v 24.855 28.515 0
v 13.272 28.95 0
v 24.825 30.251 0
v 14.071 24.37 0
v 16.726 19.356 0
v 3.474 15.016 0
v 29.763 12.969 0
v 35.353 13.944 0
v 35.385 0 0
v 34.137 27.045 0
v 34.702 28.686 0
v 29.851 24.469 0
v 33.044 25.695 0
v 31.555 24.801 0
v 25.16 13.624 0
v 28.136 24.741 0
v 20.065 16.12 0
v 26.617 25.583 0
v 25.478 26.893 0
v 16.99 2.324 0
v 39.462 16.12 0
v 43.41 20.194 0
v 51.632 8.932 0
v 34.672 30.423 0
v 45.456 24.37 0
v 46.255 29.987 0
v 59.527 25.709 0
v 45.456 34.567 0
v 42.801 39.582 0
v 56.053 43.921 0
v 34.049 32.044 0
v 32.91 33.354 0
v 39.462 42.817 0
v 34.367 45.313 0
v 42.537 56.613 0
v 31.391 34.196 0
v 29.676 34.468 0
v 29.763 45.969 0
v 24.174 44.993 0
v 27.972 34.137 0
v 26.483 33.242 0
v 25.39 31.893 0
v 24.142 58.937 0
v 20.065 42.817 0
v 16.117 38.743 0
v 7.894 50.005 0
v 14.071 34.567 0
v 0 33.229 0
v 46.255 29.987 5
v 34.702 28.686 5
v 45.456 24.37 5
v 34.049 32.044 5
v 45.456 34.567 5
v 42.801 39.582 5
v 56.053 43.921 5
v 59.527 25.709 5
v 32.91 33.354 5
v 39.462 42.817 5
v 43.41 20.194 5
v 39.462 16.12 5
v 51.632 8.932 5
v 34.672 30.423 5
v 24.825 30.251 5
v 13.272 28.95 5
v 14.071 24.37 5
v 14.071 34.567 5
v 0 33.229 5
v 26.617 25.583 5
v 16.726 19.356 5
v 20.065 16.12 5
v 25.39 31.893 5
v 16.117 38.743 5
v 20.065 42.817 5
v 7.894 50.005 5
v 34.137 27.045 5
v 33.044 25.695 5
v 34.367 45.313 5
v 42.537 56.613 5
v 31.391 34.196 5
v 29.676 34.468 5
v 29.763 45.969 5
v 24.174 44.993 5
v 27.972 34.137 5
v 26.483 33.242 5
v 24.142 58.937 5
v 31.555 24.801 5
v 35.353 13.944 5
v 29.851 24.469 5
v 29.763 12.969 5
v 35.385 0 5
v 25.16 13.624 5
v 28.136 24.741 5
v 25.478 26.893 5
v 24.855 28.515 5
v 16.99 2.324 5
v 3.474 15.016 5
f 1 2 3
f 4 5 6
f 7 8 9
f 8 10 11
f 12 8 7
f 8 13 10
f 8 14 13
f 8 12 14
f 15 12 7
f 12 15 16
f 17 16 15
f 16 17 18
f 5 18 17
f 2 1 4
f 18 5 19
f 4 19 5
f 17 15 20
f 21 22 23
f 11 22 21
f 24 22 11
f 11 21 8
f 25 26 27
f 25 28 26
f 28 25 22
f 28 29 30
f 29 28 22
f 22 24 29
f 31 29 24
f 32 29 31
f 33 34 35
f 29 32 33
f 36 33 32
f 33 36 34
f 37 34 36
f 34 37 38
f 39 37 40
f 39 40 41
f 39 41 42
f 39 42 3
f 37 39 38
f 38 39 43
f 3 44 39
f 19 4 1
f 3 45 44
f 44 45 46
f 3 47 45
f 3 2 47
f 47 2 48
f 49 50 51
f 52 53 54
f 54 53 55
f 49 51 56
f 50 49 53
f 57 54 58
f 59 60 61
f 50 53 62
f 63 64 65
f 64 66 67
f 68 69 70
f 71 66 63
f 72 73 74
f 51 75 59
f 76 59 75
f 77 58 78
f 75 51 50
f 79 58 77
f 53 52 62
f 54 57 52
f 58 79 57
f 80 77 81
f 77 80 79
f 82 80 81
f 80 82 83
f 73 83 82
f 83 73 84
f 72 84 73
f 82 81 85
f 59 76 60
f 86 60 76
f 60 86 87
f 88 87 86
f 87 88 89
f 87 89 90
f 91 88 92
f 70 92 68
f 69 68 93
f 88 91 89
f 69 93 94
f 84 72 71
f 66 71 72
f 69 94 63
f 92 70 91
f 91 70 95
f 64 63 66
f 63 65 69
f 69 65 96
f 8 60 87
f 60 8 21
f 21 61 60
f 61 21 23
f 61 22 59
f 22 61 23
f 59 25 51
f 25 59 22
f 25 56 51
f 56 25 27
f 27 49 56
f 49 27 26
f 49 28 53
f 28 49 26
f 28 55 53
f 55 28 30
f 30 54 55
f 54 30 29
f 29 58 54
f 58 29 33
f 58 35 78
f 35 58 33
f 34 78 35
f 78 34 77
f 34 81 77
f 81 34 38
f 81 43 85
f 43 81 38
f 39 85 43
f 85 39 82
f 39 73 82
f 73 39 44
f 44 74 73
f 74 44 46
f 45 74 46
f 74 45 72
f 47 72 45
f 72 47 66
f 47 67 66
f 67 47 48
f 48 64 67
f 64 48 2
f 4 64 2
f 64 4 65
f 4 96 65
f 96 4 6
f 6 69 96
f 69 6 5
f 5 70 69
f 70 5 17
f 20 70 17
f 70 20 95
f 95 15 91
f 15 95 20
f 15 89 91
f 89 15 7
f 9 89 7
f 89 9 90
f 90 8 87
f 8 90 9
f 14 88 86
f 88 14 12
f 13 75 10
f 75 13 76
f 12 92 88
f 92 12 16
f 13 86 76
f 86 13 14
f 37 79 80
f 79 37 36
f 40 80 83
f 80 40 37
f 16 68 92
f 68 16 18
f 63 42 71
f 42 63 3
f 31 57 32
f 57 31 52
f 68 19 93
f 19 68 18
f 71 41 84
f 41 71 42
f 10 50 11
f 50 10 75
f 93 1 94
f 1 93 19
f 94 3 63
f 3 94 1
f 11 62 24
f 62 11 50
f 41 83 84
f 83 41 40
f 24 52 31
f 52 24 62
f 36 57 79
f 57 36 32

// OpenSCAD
$fn = 32;

// ----------------------------------------------------------------------
// Star wheel: 10-point ratchet, R30
// ----------------------------------------------------------------------

// --- parameters (mm) ---
n_points = 10;            // number of points / teeth
r_out = 30;               // tip radius
r_in = 16.5;              // root radius
bore_r = 5;               // centre bore radius
plate_t = 5;              // plate thickness, Z (extrusion height)
bore_d = 10;              // centre bore diameter

profile = [[29.763, 45.969], [24.142, 58.937], [24.174, 44.993], [20.065, 42.817], [7.894, 50.005], [16.117, 38.743], [14.071, 34.567], [0, 33.229], [13.272, 28.95], [14.071, 24.37], [3.474, 15.016], [16.726, 19.356], [20.065, 16.12], [16.99, 2.324], [25.16, 13.624], [29.763, 12.969], [35.385, 0], [35.353, 13.944], [39.462, 16.12], [51.632, 8.932], [43.41, 20.194], [45.456, 24.37], [59.527, 25.709], [46.255, 29.987], [45.456, 34.567], [56.053, 43.921], [42.801, 39.582], [39.462, 42.817], [42.537, 56.613], [34.367, 45.313]];  // primary outline, 30 points, counter clockwise
void_1 = [[34.672, 30.423], [34.049, 32.044], [32.91, 33.354], [31.391, 34.196], [29.676, 34.468], [27.972, 34.137], [26.483, 33.242], [25.39, 31.893], [24.825, 30.251], [24.855, 28.515], [25.478, 26.893], [26.617, 25.583], [28.136, 24.741], [29.851, 24.469], [31.555, 24.801], [33.044, 25.695], [34.137, 27.045], [34.702, 28.686]];  // centre bore, 18 points

// --- the one profile operation ---
difference() {
  linear_extrude(height = plate_t) polygon(points = profile);
  translate([0, 0, -1])
    linear_extrude(height = plate_t + 2) polygon(points = void_1);
}
